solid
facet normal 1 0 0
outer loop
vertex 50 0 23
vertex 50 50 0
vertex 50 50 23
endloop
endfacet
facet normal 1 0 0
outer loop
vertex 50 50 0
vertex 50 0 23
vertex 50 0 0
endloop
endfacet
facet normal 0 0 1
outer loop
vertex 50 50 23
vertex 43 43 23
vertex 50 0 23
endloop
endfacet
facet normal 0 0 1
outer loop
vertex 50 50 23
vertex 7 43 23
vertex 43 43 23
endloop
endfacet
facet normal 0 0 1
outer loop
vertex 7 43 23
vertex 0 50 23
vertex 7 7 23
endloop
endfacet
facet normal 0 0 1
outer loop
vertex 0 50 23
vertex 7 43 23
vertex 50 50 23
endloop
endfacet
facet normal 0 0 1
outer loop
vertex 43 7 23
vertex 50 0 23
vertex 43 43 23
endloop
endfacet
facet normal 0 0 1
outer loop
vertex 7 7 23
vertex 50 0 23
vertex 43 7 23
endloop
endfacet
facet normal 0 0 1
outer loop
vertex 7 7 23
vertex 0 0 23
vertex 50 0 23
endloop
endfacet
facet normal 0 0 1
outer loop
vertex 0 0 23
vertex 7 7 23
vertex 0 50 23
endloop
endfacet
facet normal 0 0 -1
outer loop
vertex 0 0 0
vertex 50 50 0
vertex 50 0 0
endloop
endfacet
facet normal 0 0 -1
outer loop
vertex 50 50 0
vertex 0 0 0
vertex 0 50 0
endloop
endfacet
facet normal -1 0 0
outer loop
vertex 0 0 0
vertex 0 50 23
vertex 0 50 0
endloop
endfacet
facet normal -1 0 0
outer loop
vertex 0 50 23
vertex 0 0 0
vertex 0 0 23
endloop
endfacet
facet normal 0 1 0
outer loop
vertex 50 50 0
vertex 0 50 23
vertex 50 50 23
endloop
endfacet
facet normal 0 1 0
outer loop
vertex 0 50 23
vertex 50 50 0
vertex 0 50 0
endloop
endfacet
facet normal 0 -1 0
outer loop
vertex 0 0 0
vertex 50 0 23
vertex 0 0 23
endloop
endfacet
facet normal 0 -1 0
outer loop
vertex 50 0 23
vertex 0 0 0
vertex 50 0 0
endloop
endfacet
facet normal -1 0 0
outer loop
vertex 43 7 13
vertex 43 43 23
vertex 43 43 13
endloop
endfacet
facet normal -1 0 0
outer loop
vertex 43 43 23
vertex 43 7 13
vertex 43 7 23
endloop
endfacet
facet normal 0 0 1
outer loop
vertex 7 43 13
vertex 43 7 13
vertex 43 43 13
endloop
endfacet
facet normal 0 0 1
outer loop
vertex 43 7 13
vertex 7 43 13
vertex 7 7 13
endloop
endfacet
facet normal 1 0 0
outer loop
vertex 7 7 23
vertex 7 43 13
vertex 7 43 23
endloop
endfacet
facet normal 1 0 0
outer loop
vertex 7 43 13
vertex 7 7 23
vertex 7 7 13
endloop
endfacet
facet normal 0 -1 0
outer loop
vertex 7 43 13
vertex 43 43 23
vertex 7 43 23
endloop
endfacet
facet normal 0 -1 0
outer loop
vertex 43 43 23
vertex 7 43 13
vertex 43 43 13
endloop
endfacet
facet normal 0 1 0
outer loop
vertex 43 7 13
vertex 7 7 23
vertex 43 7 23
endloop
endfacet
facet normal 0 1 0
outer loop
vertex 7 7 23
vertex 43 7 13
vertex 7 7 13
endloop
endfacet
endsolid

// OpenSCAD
height = 13;
width=50;
wall=7;
wall_height=10;

difference() {
cube([width, width, height+wall_height]);
translate([wall, wall, height])
    cube([width-wall*2, width-wall*2, wall_height+1]);
}
